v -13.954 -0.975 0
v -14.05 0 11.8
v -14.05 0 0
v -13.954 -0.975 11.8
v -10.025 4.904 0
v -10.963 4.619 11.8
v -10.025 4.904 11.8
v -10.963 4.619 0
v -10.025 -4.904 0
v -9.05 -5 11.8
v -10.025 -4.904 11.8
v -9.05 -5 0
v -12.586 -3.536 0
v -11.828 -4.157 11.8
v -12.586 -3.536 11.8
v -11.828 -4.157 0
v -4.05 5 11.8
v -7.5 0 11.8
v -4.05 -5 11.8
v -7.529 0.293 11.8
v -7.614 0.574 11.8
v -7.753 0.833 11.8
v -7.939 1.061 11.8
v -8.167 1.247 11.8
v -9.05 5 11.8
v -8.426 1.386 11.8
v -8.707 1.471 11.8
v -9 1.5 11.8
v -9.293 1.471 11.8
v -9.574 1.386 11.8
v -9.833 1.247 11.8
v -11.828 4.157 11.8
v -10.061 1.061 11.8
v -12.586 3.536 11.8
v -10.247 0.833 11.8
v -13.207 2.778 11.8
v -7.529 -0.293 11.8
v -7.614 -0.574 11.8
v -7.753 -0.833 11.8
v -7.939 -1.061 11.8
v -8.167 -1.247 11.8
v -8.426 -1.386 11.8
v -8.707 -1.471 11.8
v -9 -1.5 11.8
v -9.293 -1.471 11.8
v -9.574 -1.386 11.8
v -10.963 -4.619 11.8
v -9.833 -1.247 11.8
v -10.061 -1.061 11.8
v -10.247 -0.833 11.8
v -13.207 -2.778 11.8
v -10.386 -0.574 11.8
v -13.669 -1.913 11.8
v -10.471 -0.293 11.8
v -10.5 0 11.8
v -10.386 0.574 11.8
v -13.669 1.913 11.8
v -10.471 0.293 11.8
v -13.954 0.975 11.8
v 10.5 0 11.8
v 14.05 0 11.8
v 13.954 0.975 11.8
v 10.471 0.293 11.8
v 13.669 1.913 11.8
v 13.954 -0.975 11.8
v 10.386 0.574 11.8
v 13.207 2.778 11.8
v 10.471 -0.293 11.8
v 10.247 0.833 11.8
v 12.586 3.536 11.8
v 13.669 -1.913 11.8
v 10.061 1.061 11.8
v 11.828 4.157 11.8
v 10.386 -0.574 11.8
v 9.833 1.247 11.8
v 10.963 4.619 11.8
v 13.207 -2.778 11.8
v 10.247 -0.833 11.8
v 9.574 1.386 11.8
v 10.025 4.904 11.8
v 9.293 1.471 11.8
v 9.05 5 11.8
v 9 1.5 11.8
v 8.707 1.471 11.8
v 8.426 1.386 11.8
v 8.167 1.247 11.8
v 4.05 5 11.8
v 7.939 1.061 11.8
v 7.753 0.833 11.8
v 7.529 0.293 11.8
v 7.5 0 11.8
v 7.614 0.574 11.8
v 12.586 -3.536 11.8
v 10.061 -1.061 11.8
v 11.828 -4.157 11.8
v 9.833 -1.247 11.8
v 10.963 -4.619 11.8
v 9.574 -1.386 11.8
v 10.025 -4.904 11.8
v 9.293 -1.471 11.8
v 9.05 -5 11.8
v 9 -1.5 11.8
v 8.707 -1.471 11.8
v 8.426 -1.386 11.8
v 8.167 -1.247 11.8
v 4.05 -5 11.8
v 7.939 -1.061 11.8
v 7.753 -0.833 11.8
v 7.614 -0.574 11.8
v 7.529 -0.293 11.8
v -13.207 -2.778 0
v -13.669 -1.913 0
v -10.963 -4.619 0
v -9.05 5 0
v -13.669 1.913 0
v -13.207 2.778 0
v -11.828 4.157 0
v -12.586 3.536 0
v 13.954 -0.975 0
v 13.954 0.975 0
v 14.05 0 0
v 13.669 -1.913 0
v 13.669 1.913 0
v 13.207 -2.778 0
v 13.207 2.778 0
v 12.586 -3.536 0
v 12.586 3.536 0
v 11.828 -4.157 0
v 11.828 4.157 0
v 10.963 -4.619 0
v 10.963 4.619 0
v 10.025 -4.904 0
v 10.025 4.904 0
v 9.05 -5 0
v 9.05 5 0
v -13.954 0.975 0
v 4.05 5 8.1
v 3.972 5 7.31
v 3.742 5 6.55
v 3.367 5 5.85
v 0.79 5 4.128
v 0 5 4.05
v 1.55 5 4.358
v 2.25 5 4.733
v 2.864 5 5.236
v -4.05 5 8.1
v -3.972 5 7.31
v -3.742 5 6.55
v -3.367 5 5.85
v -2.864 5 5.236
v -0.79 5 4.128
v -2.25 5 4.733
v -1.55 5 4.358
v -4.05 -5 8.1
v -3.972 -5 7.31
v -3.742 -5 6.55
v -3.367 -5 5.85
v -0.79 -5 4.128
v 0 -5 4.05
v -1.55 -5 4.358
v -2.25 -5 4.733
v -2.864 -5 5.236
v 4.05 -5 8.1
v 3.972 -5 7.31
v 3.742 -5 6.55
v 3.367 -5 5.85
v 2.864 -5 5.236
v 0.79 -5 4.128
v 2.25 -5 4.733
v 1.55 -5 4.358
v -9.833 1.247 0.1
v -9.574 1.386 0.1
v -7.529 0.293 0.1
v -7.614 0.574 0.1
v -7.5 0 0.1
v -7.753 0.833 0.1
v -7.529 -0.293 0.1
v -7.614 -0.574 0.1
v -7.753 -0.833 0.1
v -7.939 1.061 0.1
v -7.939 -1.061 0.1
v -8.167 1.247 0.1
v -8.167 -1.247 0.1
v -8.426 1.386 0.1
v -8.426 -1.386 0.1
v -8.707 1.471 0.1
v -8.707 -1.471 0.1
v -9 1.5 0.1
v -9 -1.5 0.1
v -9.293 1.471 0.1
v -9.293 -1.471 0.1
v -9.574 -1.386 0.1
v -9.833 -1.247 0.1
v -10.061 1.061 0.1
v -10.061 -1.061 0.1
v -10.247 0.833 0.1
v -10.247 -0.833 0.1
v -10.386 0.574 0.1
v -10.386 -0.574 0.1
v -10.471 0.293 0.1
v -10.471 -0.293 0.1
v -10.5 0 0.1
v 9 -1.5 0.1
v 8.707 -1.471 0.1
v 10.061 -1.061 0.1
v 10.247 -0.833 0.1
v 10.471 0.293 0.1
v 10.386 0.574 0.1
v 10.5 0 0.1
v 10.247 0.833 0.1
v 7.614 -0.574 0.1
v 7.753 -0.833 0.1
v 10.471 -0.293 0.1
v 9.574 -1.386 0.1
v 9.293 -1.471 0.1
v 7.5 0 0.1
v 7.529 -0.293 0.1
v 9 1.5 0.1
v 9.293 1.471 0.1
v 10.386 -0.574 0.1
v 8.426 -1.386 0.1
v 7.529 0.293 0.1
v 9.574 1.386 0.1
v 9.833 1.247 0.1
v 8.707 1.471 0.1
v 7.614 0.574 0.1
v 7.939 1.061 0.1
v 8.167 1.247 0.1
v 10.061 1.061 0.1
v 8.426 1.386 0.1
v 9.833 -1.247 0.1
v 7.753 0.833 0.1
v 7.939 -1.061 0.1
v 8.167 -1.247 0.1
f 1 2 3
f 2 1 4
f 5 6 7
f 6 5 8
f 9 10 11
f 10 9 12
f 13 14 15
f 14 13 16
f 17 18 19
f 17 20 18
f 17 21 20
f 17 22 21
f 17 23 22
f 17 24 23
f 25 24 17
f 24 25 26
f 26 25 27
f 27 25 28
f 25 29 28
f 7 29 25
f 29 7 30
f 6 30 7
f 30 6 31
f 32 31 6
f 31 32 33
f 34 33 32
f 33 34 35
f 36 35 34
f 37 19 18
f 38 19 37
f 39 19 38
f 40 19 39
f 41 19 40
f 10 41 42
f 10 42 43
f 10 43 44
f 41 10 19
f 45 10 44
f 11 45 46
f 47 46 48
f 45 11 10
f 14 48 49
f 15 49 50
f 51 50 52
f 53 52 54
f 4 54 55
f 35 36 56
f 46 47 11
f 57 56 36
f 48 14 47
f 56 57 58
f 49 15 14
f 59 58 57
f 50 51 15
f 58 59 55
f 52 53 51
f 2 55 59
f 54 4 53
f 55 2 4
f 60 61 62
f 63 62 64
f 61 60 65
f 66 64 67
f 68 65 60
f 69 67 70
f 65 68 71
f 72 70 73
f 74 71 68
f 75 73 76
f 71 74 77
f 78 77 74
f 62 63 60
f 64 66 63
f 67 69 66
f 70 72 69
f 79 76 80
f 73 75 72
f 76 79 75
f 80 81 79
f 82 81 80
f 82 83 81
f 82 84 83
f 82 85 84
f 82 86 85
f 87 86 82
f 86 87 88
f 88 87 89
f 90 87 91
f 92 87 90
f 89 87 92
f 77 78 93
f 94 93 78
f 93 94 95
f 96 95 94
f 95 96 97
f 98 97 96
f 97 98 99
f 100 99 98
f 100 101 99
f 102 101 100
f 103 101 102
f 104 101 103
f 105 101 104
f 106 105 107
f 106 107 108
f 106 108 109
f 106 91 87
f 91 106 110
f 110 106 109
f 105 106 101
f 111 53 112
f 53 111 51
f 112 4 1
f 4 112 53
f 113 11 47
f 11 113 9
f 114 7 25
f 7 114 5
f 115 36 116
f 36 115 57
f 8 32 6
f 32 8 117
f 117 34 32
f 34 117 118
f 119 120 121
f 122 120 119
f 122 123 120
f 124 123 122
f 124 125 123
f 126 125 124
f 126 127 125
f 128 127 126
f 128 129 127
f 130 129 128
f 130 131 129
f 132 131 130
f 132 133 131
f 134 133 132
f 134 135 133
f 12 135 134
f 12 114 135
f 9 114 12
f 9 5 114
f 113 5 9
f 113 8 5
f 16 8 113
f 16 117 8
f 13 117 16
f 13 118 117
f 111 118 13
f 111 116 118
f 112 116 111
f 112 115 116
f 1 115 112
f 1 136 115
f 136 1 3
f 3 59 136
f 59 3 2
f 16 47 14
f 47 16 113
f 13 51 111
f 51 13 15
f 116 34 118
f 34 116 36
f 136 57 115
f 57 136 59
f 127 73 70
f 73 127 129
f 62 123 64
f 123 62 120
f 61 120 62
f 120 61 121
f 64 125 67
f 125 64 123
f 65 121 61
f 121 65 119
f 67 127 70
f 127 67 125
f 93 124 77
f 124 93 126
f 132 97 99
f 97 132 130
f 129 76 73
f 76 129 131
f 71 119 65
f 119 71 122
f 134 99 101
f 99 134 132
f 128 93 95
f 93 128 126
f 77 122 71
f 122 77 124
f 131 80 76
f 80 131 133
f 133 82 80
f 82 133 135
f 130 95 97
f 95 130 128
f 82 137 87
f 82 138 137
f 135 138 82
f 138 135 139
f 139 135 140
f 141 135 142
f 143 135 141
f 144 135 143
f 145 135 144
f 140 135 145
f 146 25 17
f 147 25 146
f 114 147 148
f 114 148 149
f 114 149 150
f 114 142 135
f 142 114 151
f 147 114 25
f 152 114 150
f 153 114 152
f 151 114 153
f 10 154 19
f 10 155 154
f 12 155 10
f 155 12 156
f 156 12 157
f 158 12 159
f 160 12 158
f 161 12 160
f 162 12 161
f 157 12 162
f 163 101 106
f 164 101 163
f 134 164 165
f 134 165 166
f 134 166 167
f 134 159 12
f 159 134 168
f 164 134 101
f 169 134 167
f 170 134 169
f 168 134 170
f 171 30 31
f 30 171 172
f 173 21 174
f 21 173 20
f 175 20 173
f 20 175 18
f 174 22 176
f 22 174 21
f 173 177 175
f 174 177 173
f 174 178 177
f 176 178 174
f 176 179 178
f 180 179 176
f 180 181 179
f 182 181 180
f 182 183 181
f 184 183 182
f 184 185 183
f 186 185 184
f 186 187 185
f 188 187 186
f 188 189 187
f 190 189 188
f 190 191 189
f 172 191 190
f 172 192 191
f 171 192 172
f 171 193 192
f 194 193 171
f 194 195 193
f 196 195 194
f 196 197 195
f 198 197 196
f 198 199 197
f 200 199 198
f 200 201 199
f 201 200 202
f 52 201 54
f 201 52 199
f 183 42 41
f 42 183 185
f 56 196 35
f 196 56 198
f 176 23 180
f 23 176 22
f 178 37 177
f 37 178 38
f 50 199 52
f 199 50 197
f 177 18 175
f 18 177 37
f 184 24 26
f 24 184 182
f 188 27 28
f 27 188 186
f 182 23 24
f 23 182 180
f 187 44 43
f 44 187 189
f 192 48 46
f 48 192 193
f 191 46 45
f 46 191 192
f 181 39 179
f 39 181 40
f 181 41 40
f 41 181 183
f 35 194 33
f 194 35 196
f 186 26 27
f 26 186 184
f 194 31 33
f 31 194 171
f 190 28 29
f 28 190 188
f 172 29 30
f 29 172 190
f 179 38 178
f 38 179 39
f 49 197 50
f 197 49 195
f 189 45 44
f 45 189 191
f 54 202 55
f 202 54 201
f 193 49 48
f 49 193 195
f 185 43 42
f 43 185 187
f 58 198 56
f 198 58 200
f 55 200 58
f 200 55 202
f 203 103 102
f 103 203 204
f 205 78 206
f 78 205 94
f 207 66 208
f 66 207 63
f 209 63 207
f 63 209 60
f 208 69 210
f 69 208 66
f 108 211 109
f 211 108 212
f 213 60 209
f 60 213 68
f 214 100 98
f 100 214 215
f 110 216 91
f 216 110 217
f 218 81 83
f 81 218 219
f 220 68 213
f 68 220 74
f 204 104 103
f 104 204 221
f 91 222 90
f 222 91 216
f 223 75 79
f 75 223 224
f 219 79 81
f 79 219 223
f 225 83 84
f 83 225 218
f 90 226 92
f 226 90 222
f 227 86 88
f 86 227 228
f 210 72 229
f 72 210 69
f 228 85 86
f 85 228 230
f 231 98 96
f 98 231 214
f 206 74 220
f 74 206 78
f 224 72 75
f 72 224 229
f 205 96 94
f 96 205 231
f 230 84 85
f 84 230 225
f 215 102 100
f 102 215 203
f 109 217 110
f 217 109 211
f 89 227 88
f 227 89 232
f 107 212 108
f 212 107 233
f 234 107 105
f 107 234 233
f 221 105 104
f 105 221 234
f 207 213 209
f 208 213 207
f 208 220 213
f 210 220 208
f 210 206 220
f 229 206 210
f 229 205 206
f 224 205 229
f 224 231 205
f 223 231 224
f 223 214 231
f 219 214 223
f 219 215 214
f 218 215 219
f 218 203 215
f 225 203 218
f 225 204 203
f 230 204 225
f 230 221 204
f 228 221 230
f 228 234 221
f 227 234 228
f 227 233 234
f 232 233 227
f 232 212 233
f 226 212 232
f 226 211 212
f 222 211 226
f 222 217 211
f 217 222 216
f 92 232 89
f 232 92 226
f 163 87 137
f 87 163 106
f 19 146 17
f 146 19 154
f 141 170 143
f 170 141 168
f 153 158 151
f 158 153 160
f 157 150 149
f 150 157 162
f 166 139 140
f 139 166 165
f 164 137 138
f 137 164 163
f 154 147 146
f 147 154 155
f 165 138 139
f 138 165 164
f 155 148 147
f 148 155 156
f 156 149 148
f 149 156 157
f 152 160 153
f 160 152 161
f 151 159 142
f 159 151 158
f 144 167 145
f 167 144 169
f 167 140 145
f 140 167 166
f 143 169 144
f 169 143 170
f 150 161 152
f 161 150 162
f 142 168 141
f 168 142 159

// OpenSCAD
//OpenSCAD-Skript
//Moduldefinition mit Parametern (Beispiel Kabelschelle)
module modname (
//Parameter
dia1=10, dia2=3, hght=11.8, dia3=8.1
)
//Beginn Modul
{
difference(){   //difference 1
union(){        //union 1
difference(){   //difference 2
union(){        //union 2
    // (union 2) Alles vor nächster } zusammenfügen
//Body
translate([-dia1/2-dia3/2,0,0])
cylinder(d=dia1,h=hght,$fn=32);
translate([dia1/2+dia3/2,0,0])
cylinder(d=dia1,h=hght,$fn=32);
translate([-dia1/2-dia3/2,-dia1/2,0])
cube([dia3+dia1,dia1,hght]);
}//union 2 end
    // (difference 2) Alles vor nächster } abziehen
translate([-dia1/2-4,0,0.1])
cylinder(d=dia2,h=2*hght,$fn=32);
translate([dia1/2+4,0,0.1])
cylinder(d=dia2,h=2*hght,$fn=32);
translate([-dia3/2,-dia1/2-0.1,dia3])
cube([dia3,dia1+0.2,hght]);
translate([0,-dia1/2-0.1,dia3])
rotate([-90,0,0])
cylinder(d=dia3,h=hght, $fn=32);
}//difference 2 end
    // (union 1) Alles vor nächster } zusammenfügen
    // ...
}// union 1 end
    //(difference 1) Alles vor nächster } abziehen
    // ...

}//difference 1 end

}//module end

//Hier werden Instanzen des Moduls aufgerufen
translate([0,0,0]) modname();
